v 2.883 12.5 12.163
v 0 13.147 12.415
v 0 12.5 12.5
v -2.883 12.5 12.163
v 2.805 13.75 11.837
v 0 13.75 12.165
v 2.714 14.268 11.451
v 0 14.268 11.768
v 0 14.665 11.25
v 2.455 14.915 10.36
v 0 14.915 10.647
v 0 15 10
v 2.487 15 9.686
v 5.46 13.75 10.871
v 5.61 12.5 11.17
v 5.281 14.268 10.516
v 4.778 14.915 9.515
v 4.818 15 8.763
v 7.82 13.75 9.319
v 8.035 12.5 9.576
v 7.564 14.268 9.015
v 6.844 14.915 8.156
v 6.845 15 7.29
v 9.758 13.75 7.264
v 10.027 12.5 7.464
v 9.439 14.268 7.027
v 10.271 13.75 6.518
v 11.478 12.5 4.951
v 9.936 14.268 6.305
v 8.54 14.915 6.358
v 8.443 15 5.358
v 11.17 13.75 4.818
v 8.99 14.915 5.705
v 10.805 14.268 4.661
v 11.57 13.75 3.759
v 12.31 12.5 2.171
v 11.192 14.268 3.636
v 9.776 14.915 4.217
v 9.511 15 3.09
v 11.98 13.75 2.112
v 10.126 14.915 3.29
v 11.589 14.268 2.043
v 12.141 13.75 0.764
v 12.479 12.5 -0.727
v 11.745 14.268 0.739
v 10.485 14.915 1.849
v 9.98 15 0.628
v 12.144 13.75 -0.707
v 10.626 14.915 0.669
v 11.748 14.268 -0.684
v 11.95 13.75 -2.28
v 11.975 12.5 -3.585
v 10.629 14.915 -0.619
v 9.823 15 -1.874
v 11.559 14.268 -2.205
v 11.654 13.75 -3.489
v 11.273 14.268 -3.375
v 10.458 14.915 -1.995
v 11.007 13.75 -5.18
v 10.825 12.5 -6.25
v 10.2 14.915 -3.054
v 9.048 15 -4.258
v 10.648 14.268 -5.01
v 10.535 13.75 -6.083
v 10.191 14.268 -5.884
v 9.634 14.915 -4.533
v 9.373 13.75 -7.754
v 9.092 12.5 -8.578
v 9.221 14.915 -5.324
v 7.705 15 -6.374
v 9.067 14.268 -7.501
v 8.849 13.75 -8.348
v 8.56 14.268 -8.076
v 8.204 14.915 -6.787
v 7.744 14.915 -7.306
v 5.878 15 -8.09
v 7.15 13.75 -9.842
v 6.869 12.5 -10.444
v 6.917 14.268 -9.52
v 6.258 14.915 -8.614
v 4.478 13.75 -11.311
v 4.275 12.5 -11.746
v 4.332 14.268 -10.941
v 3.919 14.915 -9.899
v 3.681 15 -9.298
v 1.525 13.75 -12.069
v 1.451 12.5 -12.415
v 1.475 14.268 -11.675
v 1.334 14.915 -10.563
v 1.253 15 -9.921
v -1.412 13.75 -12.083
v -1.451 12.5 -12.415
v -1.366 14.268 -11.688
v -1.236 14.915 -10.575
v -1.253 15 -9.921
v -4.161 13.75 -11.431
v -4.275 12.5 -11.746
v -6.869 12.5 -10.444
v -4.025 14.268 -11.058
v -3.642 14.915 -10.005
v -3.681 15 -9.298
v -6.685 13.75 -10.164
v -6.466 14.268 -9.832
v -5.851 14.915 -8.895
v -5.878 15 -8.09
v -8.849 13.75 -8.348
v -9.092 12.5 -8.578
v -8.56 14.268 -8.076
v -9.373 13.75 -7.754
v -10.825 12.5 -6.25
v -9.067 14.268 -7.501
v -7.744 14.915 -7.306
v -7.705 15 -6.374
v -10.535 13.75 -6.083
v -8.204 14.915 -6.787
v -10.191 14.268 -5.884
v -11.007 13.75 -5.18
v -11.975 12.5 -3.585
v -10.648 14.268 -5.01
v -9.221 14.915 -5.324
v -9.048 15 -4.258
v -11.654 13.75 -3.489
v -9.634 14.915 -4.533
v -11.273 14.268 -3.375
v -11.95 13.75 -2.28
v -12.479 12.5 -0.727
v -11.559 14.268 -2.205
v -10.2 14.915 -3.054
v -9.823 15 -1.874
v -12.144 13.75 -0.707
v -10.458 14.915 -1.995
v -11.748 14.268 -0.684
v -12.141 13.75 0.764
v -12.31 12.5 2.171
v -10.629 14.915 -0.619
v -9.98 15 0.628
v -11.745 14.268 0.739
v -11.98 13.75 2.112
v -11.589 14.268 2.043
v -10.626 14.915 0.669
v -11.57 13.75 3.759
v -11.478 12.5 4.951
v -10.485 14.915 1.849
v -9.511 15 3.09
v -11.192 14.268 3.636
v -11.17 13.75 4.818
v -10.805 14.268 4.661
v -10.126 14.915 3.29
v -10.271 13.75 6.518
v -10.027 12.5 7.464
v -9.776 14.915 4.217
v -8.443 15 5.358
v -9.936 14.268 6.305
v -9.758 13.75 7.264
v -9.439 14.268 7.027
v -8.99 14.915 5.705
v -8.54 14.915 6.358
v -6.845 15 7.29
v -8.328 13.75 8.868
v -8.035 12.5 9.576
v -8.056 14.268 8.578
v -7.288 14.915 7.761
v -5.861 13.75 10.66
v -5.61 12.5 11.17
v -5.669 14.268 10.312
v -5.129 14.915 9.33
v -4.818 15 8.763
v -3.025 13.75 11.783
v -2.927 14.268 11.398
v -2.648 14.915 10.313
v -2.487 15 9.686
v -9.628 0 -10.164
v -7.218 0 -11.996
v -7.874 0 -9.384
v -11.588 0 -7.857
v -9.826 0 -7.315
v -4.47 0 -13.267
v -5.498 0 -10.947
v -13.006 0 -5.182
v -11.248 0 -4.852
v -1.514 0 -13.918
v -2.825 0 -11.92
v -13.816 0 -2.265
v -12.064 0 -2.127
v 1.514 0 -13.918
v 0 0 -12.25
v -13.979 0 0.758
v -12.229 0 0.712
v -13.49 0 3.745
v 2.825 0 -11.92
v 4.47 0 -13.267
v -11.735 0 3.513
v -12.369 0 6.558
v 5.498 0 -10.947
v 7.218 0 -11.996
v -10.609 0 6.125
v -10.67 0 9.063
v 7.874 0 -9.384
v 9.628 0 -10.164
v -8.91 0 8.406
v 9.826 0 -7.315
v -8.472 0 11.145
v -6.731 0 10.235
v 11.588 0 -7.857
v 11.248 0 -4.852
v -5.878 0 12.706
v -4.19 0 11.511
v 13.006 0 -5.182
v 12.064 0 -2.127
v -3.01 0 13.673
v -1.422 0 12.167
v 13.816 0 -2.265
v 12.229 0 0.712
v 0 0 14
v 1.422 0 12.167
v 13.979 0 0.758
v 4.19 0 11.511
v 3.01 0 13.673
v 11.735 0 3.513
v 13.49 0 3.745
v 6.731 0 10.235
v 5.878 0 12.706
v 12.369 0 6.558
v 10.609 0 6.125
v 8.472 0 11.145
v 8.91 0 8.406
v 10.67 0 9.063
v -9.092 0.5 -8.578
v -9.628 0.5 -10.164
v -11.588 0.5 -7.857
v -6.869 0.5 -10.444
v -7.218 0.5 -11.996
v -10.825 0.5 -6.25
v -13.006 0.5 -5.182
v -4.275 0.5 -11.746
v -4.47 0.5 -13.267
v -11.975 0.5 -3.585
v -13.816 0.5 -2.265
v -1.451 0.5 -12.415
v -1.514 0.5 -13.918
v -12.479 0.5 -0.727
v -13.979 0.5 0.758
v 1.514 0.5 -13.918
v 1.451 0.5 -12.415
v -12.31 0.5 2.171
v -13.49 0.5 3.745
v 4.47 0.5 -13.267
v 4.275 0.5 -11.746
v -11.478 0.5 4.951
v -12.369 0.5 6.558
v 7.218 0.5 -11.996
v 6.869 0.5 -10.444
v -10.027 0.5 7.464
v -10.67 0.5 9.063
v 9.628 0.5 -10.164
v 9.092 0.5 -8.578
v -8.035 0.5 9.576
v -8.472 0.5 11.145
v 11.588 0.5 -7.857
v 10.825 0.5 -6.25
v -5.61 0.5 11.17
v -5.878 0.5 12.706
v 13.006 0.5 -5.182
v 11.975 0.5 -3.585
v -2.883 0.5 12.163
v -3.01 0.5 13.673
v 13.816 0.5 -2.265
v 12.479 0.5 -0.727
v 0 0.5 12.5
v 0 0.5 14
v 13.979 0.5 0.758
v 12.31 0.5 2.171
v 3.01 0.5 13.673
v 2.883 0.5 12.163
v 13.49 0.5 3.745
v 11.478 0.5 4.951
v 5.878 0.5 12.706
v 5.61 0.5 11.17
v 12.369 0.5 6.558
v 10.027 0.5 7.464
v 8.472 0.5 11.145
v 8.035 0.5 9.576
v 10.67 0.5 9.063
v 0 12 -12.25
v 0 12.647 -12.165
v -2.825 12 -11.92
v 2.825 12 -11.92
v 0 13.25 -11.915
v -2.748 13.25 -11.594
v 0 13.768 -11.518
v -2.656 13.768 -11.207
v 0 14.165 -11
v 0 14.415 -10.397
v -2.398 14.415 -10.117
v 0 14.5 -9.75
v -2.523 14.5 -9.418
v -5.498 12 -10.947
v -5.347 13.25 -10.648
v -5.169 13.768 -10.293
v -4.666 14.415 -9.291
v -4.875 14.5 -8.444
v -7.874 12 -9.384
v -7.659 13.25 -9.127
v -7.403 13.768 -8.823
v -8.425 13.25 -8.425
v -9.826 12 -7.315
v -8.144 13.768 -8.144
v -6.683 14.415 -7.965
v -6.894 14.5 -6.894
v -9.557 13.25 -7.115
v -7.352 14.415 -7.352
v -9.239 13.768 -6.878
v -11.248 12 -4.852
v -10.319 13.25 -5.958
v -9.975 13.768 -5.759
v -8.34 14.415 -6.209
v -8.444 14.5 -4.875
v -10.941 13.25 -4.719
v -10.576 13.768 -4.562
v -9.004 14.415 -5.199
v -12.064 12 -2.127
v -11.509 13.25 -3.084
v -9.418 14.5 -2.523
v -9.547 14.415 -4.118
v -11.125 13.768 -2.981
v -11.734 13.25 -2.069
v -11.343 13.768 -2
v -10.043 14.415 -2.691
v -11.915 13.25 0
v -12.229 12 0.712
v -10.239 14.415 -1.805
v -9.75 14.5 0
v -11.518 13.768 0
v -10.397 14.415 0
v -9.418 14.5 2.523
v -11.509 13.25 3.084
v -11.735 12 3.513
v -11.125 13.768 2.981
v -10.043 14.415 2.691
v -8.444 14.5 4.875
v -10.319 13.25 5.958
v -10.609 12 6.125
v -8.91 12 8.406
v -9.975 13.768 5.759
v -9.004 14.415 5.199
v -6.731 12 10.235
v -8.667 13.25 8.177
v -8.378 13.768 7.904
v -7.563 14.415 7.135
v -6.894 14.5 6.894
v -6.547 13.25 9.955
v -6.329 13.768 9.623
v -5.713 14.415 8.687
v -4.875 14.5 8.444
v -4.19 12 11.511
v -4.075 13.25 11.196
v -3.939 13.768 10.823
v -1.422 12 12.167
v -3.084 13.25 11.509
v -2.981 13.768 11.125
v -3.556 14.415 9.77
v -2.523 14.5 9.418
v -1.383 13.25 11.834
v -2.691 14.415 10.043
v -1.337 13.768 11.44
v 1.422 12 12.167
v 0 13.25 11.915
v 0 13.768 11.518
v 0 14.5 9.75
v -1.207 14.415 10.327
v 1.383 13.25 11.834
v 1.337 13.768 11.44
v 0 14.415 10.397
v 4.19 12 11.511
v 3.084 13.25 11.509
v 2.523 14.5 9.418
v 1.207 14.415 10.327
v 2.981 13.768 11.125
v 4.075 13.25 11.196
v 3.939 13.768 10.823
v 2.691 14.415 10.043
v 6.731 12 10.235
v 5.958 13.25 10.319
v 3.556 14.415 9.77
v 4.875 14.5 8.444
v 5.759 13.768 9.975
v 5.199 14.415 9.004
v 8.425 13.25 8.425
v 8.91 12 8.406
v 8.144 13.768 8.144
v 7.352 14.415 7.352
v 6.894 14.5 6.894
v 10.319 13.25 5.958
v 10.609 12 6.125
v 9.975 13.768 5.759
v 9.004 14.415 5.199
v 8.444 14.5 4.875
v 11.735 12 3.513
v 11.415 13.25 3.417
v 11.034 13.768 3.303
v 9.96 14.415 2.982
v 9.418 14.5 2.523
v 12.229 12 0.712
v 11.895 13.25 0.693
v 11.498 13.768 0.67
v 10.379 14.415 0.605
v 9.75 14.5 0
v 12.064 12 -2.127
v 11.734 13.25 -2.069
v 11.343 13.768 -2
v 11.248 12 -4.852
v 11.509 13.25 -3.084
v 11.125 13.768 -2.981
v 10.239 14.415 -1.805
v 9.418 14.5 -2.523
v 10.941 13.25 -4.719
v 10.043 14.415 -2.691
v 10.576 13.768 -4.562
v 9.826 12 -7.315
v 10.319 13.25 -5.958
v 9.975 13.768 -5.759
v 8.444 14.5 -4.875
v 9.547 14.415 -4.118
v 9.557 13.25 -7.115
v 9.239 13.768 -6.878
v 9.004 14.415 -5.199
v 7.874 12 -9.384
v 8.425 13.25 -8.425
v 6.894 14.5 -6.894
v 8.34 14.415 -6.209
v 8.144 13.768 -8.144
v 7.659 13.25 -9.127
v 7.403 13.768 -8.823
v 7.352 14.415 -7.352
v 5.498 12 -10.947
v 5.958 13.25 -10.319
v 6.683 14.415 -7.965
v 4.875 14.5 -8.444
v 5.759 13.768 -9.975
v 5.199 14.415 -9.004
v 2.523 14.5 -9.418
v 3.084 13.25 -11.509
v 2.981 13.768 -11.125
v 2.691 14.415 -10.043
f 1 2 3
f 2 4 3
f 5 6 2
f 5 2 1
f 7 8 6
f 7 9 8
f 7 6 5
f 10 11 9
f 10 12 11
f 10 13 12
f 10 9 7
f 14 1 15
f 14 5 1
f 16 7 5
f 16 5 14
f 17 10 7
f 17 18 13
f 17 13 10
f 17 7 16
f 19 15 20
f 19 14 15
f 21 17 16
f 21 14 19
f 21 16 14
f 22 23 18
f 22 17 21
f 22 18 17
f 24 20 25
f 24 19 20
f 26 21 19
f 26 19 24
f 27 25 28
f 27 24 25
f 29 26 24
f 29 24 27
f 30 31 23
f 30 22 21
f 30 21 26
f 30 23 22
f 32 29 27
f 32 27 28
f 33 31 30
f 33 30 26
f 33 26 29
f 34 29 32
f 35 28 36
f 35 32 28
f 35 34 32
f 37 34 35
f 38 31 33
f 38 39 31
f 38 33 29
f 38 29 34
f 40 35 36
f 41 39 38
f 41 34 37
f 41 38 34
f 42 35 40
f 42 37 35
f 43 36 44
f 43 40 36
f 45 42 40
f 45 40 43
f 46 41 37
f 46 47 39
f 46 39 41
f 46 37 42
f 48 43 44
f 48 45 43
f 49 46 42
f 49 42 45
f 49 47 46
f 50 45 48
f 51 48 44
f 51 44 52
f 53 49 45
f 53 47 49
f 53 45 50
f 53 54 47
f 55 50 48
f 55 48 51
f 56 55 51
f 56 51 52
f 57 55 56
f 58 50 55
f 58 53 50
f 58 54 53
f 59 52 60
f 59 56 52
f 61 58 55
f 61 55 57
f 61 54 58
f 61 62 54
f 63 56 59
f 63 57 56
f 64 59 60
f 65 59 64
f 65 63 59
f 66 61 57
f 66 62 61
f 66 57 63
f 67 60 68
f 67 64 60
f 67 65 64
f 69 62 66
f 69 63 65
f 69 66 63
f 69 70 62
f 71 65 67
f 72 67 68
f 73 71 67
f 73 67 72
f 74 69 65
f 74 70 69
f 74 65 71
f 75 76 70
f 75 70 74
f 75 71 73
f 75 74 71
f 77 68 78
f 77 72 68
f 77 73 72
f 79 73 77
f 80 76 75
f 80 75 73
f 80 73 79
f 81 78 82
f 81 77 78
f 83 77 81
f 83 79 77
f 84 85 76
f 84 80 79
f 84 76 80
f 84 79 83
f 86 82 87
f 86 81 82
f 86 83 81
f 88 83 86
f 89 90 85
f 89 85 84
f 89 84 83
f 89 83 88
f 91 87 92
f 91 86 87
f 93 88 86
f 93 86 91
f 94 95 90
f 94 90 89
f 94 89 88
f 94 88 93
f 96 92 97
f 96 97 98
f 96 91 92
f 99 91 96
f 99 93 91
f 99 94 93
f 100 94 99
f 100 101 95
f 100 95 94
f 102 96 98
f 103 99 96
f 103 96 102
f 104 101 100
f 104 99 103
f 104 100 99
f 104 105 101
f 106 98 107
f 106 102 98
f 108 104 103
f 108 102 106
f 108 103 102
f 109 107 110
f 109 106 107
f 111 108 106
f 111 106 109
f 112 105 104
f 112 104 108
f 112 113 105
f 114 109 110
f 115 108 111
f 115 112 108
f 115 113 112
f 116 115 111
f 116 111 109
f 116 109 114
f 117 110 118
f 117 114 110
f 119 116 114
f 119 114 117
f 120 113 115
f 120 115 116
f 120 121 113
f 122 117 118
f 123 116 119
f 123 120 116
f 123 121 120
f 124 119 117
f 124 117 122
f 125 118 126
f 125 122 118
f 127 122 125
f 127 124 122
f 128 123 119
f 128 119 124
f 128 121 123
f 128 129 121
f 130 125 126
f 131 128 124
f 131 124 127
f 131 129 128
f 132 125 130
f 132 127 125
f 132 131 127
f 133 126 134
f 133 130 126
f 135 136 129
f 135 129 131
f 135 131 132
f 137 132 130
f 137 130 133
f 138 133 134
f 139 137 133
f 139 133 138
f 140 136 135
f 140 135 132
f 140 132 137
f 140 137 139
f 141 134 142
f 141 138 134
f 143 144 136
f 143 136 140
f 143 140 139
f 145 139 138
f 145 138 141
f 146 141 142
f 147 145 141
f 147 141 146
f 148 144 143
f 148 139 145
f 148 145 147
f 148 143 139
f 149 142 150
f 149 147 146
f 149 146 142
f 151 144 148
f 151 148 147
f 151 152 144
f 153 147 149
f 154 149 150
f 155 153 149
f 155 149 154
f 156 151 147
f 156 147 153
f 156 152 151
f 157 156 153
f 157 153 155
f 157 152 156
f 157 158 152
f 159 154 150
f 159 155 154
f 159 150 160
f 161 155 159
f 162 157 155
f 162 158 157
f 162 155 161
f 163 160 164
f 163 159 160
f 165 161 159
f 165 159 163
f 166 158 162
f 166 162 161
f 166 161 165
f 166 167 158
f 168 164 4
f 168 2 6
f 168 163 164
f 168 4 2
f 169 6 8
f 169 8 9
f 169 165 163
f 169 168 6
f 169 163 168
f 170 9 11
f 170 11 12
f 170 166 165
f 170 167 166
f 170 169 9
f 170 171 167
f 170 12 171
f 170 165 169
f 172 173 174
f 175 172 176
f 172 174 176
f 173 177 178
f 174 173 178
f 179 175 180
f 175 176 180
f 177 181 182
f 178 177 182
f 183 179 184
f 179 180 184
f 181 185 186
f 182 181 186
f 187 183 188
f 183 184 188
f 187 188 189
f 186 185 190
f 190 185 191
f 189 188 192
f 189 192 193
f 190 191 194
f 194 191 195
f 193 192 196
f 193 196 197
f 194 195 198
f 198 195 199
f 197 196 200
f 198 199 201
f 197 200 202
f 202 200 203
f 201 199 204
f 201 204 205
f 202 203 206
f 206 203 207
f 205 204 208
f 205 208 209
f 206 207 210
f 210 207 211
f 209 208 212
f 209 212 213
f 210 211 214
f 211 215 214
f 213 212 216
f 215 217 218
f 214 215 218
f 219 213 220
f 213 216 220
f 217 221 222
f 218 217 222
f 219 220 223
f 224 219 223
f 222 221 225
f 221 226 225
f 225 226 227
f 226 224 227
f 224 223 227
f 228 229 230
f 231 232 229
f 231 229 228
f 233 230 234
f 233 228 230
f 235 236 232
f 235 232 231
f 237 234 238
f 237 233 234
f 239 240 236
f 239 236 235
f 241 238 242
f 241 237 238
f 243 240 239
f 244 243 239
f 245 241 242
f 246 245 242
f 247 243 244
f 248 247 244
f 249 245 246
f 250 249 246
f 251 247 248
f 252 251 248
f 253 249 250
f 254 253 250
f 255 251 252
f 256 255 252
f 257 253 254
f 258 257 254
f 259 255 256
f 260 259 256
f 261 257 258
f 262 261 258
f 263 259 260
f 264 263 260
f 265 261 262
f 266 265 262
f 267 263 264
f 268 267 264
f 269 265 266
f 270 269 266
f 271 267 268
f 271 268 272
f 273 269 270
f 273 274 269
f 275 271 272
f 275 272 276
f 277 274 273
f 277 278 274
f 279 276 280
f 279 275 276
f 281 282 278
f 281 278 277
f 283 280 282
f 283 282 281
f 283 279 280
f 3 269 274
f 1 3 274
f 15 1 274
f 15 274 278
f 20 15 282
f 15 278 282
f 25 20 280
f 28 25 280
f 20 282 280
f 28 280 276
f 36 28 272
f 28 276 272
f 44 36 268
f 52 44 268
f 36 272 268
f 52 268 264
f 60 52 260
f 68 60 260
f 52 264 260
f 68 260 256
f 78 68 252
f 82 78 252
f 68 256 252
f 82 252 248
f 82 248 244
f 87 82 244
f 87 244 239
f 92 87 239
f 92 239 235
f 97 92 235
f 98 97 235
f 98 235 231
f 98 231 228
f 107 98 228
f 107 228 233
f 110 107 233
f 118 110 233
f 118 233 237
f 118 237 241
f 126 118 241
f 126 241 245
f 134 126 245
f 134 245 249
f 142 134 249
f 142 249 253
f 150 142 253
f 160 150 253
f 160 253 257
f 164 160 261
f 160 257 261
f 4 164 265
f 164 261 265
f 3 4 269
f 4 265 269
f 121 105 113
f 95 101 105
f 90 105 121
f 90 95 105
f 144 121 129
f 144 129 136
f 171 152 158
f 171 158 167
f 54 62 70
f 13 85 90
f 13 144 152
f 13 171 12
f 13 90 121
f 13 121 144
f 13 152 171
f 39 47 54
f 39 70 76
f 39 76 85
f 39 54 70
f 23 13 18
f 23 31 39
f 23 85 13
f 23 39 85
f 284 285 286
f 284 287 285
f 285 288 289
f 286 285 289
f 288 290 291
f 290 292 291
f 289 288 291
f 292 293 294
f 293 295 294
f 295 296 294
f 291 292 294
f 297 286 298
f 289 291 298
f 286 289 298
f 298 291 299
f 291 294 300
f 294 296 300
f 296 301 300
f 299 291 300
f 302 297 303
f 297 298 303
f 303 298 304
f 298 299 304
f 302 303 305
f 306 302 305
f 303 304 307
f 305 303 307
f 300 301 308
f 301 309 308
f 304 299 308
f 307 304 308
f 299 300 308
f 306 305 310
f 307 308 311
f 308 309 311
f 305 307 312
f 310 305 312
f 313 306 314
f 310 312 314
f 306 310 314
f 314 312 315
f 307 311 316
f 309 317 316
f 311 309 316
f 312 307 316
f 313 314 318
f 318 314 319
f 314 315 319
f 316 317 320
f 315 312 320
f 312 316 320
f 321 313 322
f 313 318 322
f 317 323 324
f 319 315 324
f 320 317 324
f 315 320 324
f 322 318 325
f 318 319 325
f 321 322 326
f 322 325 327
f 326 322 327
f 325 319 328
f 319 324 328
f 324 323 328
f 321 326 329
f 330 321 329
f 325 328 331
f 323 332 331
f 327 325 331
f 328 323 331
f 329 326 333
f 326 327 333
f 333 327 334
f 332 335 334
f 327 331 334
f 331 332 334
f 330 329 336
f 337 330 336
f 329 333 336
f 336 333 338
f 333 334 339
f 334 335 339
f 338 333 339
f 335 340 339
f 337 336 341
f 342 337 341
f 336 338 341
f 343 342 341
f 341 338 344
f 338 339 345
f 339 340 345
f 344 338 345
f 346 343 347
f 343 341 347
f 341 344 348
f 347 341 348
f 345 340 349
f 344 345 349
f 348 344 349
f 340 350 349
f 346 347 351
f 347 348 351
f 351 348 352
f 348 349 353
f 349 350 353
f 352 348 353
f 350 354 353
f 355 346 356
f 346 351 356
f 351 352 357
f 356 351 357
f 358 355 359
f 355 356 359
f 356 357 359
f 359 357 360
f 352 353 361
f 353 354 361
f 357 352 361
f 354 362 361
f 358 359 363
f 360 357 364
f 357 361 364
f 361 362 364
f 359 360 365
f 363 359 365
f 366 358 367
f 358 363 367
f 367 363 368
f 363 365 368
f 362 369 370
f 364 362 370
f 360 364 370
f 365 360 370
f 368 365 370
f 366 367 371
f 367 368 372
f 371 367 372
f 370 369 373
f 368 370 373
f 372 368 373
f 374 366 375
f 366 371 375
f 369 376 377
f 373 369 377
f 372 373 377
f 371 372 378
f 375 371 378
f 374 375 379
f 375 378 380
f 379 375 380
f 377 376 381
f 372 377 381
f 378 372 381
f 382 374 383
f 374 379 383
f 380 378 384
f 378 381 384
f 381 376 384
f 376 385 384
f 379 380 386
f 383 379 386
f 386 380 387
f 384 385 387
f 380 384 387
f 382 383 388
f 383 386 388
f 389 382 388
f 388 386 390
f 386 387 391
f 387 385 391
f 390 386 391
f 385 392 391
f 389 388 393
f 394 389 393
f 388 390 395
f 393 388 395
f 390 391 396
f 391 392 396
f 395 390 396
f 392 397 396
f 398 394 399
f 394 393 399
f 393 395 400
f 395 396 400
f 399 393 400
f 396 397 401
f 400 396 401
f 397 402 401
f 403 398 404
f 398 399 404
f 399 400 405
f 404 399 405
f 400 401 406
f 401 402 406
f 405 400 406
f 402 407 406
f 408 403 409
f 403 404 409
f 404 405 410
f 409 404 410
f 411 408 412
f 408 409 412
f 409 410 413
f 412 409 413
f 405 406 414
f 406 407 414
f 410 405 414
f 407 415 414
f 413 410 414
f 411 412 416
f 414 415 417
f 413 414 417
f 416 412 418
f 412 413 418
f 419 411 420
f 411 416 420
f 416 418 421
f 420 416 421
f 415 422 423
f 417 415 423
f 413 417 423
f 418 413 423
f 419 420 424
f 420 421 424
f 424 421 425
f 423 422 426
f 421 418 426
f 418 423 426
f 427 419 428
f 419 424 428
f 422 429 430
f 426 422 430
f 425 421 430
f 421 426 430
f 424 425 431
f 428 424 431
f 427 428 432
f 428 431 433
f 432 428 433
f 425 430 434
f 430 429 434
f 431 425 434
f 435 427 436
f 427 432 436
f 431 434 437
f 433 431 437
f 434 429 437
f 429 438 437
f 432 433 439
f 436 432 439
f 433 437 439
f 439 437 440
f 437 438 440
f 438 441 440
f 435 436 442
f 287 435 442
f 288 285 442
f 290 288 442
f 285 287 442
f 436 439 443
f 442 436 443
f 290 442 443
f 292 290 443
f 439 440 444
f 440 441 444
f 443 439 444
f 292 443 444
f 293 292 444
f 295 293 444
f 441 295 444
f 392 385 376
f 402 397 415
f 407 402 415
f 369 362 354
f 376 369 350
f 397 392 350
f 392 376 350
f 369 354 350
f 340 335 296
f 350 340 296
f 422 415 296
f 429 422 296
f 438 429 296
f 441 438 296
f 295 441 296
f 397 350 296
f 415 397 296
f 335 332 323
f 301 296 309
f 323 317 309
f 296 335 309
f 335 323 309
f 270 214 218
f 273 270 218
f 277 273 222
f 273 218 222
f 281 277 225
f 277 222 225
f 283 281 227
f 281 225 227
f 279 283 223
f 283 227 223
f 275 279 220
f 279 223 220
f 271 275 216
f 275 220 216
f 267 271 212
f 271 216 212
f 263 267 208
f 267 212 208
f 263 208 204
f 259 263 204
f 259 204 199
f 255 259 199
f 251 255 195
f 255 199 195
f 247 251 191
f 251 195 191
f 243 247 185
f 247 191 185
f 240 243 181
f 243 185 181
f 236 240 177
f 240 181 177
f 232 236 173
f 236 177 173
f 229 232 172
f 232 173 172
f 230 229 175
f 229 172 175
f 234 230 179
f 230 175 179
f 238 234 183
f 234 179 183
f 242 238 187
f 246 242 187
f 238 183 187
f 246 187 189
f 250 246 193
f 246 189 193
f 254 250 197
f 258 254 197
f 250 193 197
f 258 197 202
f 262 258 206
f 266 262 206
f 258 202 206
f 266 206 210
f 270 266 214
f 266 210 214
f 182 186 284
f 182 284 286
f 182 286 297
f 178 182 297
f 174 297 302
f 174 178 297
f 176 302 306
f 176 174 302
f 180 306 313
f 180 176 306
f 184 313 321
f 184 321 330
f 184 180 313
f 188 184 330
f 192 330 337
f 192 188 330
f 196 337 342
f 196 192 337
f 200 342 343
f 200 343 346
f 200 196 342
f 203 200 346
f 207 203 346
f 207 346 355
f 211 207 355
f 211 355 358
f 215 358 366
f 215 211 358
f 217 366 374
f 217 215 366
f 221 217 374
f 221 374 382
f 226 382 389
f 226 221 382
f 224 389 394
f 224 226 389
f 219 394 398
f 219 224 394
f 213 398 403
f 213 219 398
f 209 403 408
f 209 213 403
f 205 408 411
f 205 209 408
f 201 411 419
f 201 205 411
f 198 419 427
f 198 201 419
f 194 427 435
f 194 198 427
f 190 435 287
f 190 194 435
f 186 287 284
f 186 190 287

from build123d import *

# Parameters (mm, degrees)
SKETCH1_R           = 12.5
BOSS_EXTRUDE2_DEPTH = 15
SKETCH2_R           = 14
BOSS_EXTRUDE3_DEPTH = 0.5
SKETCH3_R           = 12.25
CUT_EXTRUDE1_DEPTH  = 14.5
FILLET1_R           = 2.5
FILLET2_R           = 2.5


with BuildPart() as part:
    # Sketch1 → Boss-Extrude2 (new body)
    with BuildSketch(Plane(origin=(0, 0, 0), x_dir=(1, 0, 0), z_dir=(0, 1, 0))):
        with Locations(Location((0, 0, 0), (0, 0, 270))):
            Circle(SKETCH1_R)
    extrude(amount=BOSS_EXTRUDE2_DEPTH)

    # Sketch2 → Boss-Extrude3 (add)
    with BuildSketch(Plane(origin=(0, 0, 0), x_dir=(1, 0, 0), z_dir=(0, 1, 0))):
        with Locations(Location((0, 0, 0), (0, 0, 270))):
            Circle(SKETCH2_R)
    extrude(amount=BOSS_EXTRUDE3_DEPTH)

    # Sketch3 → Cut-Extrude1 (cut)
    with BuildSketch(Plane(origin=(0, 0, 0), x_dir=(1, 0, 0), z_dir=(0, 1, 0))):
        with Locations(Location((0, 0, 0), (0, 0, 90))):
            Circle(SKETCH3_R)
    extrude(amount=CUT_EXTRUDE1_DEPTH, mode=Mode.SUBTRACT)

    # Fillet1
    fillet1_edges = [part.edges().sort_by_distance(p)[0] for p in [
        (0, 15, -12.5),
    ]]
    fillet(fillet1_edges, radius=FILLET1_R)

    # Fillet2
    fillet2_edges = [part.edges().sort_by_distance(p)[0] for p in [
        (0, 14.5, 12.25),
    ]]
    fillet(fillet2_edges, radius=FILLET2_R)


solid = part.part
